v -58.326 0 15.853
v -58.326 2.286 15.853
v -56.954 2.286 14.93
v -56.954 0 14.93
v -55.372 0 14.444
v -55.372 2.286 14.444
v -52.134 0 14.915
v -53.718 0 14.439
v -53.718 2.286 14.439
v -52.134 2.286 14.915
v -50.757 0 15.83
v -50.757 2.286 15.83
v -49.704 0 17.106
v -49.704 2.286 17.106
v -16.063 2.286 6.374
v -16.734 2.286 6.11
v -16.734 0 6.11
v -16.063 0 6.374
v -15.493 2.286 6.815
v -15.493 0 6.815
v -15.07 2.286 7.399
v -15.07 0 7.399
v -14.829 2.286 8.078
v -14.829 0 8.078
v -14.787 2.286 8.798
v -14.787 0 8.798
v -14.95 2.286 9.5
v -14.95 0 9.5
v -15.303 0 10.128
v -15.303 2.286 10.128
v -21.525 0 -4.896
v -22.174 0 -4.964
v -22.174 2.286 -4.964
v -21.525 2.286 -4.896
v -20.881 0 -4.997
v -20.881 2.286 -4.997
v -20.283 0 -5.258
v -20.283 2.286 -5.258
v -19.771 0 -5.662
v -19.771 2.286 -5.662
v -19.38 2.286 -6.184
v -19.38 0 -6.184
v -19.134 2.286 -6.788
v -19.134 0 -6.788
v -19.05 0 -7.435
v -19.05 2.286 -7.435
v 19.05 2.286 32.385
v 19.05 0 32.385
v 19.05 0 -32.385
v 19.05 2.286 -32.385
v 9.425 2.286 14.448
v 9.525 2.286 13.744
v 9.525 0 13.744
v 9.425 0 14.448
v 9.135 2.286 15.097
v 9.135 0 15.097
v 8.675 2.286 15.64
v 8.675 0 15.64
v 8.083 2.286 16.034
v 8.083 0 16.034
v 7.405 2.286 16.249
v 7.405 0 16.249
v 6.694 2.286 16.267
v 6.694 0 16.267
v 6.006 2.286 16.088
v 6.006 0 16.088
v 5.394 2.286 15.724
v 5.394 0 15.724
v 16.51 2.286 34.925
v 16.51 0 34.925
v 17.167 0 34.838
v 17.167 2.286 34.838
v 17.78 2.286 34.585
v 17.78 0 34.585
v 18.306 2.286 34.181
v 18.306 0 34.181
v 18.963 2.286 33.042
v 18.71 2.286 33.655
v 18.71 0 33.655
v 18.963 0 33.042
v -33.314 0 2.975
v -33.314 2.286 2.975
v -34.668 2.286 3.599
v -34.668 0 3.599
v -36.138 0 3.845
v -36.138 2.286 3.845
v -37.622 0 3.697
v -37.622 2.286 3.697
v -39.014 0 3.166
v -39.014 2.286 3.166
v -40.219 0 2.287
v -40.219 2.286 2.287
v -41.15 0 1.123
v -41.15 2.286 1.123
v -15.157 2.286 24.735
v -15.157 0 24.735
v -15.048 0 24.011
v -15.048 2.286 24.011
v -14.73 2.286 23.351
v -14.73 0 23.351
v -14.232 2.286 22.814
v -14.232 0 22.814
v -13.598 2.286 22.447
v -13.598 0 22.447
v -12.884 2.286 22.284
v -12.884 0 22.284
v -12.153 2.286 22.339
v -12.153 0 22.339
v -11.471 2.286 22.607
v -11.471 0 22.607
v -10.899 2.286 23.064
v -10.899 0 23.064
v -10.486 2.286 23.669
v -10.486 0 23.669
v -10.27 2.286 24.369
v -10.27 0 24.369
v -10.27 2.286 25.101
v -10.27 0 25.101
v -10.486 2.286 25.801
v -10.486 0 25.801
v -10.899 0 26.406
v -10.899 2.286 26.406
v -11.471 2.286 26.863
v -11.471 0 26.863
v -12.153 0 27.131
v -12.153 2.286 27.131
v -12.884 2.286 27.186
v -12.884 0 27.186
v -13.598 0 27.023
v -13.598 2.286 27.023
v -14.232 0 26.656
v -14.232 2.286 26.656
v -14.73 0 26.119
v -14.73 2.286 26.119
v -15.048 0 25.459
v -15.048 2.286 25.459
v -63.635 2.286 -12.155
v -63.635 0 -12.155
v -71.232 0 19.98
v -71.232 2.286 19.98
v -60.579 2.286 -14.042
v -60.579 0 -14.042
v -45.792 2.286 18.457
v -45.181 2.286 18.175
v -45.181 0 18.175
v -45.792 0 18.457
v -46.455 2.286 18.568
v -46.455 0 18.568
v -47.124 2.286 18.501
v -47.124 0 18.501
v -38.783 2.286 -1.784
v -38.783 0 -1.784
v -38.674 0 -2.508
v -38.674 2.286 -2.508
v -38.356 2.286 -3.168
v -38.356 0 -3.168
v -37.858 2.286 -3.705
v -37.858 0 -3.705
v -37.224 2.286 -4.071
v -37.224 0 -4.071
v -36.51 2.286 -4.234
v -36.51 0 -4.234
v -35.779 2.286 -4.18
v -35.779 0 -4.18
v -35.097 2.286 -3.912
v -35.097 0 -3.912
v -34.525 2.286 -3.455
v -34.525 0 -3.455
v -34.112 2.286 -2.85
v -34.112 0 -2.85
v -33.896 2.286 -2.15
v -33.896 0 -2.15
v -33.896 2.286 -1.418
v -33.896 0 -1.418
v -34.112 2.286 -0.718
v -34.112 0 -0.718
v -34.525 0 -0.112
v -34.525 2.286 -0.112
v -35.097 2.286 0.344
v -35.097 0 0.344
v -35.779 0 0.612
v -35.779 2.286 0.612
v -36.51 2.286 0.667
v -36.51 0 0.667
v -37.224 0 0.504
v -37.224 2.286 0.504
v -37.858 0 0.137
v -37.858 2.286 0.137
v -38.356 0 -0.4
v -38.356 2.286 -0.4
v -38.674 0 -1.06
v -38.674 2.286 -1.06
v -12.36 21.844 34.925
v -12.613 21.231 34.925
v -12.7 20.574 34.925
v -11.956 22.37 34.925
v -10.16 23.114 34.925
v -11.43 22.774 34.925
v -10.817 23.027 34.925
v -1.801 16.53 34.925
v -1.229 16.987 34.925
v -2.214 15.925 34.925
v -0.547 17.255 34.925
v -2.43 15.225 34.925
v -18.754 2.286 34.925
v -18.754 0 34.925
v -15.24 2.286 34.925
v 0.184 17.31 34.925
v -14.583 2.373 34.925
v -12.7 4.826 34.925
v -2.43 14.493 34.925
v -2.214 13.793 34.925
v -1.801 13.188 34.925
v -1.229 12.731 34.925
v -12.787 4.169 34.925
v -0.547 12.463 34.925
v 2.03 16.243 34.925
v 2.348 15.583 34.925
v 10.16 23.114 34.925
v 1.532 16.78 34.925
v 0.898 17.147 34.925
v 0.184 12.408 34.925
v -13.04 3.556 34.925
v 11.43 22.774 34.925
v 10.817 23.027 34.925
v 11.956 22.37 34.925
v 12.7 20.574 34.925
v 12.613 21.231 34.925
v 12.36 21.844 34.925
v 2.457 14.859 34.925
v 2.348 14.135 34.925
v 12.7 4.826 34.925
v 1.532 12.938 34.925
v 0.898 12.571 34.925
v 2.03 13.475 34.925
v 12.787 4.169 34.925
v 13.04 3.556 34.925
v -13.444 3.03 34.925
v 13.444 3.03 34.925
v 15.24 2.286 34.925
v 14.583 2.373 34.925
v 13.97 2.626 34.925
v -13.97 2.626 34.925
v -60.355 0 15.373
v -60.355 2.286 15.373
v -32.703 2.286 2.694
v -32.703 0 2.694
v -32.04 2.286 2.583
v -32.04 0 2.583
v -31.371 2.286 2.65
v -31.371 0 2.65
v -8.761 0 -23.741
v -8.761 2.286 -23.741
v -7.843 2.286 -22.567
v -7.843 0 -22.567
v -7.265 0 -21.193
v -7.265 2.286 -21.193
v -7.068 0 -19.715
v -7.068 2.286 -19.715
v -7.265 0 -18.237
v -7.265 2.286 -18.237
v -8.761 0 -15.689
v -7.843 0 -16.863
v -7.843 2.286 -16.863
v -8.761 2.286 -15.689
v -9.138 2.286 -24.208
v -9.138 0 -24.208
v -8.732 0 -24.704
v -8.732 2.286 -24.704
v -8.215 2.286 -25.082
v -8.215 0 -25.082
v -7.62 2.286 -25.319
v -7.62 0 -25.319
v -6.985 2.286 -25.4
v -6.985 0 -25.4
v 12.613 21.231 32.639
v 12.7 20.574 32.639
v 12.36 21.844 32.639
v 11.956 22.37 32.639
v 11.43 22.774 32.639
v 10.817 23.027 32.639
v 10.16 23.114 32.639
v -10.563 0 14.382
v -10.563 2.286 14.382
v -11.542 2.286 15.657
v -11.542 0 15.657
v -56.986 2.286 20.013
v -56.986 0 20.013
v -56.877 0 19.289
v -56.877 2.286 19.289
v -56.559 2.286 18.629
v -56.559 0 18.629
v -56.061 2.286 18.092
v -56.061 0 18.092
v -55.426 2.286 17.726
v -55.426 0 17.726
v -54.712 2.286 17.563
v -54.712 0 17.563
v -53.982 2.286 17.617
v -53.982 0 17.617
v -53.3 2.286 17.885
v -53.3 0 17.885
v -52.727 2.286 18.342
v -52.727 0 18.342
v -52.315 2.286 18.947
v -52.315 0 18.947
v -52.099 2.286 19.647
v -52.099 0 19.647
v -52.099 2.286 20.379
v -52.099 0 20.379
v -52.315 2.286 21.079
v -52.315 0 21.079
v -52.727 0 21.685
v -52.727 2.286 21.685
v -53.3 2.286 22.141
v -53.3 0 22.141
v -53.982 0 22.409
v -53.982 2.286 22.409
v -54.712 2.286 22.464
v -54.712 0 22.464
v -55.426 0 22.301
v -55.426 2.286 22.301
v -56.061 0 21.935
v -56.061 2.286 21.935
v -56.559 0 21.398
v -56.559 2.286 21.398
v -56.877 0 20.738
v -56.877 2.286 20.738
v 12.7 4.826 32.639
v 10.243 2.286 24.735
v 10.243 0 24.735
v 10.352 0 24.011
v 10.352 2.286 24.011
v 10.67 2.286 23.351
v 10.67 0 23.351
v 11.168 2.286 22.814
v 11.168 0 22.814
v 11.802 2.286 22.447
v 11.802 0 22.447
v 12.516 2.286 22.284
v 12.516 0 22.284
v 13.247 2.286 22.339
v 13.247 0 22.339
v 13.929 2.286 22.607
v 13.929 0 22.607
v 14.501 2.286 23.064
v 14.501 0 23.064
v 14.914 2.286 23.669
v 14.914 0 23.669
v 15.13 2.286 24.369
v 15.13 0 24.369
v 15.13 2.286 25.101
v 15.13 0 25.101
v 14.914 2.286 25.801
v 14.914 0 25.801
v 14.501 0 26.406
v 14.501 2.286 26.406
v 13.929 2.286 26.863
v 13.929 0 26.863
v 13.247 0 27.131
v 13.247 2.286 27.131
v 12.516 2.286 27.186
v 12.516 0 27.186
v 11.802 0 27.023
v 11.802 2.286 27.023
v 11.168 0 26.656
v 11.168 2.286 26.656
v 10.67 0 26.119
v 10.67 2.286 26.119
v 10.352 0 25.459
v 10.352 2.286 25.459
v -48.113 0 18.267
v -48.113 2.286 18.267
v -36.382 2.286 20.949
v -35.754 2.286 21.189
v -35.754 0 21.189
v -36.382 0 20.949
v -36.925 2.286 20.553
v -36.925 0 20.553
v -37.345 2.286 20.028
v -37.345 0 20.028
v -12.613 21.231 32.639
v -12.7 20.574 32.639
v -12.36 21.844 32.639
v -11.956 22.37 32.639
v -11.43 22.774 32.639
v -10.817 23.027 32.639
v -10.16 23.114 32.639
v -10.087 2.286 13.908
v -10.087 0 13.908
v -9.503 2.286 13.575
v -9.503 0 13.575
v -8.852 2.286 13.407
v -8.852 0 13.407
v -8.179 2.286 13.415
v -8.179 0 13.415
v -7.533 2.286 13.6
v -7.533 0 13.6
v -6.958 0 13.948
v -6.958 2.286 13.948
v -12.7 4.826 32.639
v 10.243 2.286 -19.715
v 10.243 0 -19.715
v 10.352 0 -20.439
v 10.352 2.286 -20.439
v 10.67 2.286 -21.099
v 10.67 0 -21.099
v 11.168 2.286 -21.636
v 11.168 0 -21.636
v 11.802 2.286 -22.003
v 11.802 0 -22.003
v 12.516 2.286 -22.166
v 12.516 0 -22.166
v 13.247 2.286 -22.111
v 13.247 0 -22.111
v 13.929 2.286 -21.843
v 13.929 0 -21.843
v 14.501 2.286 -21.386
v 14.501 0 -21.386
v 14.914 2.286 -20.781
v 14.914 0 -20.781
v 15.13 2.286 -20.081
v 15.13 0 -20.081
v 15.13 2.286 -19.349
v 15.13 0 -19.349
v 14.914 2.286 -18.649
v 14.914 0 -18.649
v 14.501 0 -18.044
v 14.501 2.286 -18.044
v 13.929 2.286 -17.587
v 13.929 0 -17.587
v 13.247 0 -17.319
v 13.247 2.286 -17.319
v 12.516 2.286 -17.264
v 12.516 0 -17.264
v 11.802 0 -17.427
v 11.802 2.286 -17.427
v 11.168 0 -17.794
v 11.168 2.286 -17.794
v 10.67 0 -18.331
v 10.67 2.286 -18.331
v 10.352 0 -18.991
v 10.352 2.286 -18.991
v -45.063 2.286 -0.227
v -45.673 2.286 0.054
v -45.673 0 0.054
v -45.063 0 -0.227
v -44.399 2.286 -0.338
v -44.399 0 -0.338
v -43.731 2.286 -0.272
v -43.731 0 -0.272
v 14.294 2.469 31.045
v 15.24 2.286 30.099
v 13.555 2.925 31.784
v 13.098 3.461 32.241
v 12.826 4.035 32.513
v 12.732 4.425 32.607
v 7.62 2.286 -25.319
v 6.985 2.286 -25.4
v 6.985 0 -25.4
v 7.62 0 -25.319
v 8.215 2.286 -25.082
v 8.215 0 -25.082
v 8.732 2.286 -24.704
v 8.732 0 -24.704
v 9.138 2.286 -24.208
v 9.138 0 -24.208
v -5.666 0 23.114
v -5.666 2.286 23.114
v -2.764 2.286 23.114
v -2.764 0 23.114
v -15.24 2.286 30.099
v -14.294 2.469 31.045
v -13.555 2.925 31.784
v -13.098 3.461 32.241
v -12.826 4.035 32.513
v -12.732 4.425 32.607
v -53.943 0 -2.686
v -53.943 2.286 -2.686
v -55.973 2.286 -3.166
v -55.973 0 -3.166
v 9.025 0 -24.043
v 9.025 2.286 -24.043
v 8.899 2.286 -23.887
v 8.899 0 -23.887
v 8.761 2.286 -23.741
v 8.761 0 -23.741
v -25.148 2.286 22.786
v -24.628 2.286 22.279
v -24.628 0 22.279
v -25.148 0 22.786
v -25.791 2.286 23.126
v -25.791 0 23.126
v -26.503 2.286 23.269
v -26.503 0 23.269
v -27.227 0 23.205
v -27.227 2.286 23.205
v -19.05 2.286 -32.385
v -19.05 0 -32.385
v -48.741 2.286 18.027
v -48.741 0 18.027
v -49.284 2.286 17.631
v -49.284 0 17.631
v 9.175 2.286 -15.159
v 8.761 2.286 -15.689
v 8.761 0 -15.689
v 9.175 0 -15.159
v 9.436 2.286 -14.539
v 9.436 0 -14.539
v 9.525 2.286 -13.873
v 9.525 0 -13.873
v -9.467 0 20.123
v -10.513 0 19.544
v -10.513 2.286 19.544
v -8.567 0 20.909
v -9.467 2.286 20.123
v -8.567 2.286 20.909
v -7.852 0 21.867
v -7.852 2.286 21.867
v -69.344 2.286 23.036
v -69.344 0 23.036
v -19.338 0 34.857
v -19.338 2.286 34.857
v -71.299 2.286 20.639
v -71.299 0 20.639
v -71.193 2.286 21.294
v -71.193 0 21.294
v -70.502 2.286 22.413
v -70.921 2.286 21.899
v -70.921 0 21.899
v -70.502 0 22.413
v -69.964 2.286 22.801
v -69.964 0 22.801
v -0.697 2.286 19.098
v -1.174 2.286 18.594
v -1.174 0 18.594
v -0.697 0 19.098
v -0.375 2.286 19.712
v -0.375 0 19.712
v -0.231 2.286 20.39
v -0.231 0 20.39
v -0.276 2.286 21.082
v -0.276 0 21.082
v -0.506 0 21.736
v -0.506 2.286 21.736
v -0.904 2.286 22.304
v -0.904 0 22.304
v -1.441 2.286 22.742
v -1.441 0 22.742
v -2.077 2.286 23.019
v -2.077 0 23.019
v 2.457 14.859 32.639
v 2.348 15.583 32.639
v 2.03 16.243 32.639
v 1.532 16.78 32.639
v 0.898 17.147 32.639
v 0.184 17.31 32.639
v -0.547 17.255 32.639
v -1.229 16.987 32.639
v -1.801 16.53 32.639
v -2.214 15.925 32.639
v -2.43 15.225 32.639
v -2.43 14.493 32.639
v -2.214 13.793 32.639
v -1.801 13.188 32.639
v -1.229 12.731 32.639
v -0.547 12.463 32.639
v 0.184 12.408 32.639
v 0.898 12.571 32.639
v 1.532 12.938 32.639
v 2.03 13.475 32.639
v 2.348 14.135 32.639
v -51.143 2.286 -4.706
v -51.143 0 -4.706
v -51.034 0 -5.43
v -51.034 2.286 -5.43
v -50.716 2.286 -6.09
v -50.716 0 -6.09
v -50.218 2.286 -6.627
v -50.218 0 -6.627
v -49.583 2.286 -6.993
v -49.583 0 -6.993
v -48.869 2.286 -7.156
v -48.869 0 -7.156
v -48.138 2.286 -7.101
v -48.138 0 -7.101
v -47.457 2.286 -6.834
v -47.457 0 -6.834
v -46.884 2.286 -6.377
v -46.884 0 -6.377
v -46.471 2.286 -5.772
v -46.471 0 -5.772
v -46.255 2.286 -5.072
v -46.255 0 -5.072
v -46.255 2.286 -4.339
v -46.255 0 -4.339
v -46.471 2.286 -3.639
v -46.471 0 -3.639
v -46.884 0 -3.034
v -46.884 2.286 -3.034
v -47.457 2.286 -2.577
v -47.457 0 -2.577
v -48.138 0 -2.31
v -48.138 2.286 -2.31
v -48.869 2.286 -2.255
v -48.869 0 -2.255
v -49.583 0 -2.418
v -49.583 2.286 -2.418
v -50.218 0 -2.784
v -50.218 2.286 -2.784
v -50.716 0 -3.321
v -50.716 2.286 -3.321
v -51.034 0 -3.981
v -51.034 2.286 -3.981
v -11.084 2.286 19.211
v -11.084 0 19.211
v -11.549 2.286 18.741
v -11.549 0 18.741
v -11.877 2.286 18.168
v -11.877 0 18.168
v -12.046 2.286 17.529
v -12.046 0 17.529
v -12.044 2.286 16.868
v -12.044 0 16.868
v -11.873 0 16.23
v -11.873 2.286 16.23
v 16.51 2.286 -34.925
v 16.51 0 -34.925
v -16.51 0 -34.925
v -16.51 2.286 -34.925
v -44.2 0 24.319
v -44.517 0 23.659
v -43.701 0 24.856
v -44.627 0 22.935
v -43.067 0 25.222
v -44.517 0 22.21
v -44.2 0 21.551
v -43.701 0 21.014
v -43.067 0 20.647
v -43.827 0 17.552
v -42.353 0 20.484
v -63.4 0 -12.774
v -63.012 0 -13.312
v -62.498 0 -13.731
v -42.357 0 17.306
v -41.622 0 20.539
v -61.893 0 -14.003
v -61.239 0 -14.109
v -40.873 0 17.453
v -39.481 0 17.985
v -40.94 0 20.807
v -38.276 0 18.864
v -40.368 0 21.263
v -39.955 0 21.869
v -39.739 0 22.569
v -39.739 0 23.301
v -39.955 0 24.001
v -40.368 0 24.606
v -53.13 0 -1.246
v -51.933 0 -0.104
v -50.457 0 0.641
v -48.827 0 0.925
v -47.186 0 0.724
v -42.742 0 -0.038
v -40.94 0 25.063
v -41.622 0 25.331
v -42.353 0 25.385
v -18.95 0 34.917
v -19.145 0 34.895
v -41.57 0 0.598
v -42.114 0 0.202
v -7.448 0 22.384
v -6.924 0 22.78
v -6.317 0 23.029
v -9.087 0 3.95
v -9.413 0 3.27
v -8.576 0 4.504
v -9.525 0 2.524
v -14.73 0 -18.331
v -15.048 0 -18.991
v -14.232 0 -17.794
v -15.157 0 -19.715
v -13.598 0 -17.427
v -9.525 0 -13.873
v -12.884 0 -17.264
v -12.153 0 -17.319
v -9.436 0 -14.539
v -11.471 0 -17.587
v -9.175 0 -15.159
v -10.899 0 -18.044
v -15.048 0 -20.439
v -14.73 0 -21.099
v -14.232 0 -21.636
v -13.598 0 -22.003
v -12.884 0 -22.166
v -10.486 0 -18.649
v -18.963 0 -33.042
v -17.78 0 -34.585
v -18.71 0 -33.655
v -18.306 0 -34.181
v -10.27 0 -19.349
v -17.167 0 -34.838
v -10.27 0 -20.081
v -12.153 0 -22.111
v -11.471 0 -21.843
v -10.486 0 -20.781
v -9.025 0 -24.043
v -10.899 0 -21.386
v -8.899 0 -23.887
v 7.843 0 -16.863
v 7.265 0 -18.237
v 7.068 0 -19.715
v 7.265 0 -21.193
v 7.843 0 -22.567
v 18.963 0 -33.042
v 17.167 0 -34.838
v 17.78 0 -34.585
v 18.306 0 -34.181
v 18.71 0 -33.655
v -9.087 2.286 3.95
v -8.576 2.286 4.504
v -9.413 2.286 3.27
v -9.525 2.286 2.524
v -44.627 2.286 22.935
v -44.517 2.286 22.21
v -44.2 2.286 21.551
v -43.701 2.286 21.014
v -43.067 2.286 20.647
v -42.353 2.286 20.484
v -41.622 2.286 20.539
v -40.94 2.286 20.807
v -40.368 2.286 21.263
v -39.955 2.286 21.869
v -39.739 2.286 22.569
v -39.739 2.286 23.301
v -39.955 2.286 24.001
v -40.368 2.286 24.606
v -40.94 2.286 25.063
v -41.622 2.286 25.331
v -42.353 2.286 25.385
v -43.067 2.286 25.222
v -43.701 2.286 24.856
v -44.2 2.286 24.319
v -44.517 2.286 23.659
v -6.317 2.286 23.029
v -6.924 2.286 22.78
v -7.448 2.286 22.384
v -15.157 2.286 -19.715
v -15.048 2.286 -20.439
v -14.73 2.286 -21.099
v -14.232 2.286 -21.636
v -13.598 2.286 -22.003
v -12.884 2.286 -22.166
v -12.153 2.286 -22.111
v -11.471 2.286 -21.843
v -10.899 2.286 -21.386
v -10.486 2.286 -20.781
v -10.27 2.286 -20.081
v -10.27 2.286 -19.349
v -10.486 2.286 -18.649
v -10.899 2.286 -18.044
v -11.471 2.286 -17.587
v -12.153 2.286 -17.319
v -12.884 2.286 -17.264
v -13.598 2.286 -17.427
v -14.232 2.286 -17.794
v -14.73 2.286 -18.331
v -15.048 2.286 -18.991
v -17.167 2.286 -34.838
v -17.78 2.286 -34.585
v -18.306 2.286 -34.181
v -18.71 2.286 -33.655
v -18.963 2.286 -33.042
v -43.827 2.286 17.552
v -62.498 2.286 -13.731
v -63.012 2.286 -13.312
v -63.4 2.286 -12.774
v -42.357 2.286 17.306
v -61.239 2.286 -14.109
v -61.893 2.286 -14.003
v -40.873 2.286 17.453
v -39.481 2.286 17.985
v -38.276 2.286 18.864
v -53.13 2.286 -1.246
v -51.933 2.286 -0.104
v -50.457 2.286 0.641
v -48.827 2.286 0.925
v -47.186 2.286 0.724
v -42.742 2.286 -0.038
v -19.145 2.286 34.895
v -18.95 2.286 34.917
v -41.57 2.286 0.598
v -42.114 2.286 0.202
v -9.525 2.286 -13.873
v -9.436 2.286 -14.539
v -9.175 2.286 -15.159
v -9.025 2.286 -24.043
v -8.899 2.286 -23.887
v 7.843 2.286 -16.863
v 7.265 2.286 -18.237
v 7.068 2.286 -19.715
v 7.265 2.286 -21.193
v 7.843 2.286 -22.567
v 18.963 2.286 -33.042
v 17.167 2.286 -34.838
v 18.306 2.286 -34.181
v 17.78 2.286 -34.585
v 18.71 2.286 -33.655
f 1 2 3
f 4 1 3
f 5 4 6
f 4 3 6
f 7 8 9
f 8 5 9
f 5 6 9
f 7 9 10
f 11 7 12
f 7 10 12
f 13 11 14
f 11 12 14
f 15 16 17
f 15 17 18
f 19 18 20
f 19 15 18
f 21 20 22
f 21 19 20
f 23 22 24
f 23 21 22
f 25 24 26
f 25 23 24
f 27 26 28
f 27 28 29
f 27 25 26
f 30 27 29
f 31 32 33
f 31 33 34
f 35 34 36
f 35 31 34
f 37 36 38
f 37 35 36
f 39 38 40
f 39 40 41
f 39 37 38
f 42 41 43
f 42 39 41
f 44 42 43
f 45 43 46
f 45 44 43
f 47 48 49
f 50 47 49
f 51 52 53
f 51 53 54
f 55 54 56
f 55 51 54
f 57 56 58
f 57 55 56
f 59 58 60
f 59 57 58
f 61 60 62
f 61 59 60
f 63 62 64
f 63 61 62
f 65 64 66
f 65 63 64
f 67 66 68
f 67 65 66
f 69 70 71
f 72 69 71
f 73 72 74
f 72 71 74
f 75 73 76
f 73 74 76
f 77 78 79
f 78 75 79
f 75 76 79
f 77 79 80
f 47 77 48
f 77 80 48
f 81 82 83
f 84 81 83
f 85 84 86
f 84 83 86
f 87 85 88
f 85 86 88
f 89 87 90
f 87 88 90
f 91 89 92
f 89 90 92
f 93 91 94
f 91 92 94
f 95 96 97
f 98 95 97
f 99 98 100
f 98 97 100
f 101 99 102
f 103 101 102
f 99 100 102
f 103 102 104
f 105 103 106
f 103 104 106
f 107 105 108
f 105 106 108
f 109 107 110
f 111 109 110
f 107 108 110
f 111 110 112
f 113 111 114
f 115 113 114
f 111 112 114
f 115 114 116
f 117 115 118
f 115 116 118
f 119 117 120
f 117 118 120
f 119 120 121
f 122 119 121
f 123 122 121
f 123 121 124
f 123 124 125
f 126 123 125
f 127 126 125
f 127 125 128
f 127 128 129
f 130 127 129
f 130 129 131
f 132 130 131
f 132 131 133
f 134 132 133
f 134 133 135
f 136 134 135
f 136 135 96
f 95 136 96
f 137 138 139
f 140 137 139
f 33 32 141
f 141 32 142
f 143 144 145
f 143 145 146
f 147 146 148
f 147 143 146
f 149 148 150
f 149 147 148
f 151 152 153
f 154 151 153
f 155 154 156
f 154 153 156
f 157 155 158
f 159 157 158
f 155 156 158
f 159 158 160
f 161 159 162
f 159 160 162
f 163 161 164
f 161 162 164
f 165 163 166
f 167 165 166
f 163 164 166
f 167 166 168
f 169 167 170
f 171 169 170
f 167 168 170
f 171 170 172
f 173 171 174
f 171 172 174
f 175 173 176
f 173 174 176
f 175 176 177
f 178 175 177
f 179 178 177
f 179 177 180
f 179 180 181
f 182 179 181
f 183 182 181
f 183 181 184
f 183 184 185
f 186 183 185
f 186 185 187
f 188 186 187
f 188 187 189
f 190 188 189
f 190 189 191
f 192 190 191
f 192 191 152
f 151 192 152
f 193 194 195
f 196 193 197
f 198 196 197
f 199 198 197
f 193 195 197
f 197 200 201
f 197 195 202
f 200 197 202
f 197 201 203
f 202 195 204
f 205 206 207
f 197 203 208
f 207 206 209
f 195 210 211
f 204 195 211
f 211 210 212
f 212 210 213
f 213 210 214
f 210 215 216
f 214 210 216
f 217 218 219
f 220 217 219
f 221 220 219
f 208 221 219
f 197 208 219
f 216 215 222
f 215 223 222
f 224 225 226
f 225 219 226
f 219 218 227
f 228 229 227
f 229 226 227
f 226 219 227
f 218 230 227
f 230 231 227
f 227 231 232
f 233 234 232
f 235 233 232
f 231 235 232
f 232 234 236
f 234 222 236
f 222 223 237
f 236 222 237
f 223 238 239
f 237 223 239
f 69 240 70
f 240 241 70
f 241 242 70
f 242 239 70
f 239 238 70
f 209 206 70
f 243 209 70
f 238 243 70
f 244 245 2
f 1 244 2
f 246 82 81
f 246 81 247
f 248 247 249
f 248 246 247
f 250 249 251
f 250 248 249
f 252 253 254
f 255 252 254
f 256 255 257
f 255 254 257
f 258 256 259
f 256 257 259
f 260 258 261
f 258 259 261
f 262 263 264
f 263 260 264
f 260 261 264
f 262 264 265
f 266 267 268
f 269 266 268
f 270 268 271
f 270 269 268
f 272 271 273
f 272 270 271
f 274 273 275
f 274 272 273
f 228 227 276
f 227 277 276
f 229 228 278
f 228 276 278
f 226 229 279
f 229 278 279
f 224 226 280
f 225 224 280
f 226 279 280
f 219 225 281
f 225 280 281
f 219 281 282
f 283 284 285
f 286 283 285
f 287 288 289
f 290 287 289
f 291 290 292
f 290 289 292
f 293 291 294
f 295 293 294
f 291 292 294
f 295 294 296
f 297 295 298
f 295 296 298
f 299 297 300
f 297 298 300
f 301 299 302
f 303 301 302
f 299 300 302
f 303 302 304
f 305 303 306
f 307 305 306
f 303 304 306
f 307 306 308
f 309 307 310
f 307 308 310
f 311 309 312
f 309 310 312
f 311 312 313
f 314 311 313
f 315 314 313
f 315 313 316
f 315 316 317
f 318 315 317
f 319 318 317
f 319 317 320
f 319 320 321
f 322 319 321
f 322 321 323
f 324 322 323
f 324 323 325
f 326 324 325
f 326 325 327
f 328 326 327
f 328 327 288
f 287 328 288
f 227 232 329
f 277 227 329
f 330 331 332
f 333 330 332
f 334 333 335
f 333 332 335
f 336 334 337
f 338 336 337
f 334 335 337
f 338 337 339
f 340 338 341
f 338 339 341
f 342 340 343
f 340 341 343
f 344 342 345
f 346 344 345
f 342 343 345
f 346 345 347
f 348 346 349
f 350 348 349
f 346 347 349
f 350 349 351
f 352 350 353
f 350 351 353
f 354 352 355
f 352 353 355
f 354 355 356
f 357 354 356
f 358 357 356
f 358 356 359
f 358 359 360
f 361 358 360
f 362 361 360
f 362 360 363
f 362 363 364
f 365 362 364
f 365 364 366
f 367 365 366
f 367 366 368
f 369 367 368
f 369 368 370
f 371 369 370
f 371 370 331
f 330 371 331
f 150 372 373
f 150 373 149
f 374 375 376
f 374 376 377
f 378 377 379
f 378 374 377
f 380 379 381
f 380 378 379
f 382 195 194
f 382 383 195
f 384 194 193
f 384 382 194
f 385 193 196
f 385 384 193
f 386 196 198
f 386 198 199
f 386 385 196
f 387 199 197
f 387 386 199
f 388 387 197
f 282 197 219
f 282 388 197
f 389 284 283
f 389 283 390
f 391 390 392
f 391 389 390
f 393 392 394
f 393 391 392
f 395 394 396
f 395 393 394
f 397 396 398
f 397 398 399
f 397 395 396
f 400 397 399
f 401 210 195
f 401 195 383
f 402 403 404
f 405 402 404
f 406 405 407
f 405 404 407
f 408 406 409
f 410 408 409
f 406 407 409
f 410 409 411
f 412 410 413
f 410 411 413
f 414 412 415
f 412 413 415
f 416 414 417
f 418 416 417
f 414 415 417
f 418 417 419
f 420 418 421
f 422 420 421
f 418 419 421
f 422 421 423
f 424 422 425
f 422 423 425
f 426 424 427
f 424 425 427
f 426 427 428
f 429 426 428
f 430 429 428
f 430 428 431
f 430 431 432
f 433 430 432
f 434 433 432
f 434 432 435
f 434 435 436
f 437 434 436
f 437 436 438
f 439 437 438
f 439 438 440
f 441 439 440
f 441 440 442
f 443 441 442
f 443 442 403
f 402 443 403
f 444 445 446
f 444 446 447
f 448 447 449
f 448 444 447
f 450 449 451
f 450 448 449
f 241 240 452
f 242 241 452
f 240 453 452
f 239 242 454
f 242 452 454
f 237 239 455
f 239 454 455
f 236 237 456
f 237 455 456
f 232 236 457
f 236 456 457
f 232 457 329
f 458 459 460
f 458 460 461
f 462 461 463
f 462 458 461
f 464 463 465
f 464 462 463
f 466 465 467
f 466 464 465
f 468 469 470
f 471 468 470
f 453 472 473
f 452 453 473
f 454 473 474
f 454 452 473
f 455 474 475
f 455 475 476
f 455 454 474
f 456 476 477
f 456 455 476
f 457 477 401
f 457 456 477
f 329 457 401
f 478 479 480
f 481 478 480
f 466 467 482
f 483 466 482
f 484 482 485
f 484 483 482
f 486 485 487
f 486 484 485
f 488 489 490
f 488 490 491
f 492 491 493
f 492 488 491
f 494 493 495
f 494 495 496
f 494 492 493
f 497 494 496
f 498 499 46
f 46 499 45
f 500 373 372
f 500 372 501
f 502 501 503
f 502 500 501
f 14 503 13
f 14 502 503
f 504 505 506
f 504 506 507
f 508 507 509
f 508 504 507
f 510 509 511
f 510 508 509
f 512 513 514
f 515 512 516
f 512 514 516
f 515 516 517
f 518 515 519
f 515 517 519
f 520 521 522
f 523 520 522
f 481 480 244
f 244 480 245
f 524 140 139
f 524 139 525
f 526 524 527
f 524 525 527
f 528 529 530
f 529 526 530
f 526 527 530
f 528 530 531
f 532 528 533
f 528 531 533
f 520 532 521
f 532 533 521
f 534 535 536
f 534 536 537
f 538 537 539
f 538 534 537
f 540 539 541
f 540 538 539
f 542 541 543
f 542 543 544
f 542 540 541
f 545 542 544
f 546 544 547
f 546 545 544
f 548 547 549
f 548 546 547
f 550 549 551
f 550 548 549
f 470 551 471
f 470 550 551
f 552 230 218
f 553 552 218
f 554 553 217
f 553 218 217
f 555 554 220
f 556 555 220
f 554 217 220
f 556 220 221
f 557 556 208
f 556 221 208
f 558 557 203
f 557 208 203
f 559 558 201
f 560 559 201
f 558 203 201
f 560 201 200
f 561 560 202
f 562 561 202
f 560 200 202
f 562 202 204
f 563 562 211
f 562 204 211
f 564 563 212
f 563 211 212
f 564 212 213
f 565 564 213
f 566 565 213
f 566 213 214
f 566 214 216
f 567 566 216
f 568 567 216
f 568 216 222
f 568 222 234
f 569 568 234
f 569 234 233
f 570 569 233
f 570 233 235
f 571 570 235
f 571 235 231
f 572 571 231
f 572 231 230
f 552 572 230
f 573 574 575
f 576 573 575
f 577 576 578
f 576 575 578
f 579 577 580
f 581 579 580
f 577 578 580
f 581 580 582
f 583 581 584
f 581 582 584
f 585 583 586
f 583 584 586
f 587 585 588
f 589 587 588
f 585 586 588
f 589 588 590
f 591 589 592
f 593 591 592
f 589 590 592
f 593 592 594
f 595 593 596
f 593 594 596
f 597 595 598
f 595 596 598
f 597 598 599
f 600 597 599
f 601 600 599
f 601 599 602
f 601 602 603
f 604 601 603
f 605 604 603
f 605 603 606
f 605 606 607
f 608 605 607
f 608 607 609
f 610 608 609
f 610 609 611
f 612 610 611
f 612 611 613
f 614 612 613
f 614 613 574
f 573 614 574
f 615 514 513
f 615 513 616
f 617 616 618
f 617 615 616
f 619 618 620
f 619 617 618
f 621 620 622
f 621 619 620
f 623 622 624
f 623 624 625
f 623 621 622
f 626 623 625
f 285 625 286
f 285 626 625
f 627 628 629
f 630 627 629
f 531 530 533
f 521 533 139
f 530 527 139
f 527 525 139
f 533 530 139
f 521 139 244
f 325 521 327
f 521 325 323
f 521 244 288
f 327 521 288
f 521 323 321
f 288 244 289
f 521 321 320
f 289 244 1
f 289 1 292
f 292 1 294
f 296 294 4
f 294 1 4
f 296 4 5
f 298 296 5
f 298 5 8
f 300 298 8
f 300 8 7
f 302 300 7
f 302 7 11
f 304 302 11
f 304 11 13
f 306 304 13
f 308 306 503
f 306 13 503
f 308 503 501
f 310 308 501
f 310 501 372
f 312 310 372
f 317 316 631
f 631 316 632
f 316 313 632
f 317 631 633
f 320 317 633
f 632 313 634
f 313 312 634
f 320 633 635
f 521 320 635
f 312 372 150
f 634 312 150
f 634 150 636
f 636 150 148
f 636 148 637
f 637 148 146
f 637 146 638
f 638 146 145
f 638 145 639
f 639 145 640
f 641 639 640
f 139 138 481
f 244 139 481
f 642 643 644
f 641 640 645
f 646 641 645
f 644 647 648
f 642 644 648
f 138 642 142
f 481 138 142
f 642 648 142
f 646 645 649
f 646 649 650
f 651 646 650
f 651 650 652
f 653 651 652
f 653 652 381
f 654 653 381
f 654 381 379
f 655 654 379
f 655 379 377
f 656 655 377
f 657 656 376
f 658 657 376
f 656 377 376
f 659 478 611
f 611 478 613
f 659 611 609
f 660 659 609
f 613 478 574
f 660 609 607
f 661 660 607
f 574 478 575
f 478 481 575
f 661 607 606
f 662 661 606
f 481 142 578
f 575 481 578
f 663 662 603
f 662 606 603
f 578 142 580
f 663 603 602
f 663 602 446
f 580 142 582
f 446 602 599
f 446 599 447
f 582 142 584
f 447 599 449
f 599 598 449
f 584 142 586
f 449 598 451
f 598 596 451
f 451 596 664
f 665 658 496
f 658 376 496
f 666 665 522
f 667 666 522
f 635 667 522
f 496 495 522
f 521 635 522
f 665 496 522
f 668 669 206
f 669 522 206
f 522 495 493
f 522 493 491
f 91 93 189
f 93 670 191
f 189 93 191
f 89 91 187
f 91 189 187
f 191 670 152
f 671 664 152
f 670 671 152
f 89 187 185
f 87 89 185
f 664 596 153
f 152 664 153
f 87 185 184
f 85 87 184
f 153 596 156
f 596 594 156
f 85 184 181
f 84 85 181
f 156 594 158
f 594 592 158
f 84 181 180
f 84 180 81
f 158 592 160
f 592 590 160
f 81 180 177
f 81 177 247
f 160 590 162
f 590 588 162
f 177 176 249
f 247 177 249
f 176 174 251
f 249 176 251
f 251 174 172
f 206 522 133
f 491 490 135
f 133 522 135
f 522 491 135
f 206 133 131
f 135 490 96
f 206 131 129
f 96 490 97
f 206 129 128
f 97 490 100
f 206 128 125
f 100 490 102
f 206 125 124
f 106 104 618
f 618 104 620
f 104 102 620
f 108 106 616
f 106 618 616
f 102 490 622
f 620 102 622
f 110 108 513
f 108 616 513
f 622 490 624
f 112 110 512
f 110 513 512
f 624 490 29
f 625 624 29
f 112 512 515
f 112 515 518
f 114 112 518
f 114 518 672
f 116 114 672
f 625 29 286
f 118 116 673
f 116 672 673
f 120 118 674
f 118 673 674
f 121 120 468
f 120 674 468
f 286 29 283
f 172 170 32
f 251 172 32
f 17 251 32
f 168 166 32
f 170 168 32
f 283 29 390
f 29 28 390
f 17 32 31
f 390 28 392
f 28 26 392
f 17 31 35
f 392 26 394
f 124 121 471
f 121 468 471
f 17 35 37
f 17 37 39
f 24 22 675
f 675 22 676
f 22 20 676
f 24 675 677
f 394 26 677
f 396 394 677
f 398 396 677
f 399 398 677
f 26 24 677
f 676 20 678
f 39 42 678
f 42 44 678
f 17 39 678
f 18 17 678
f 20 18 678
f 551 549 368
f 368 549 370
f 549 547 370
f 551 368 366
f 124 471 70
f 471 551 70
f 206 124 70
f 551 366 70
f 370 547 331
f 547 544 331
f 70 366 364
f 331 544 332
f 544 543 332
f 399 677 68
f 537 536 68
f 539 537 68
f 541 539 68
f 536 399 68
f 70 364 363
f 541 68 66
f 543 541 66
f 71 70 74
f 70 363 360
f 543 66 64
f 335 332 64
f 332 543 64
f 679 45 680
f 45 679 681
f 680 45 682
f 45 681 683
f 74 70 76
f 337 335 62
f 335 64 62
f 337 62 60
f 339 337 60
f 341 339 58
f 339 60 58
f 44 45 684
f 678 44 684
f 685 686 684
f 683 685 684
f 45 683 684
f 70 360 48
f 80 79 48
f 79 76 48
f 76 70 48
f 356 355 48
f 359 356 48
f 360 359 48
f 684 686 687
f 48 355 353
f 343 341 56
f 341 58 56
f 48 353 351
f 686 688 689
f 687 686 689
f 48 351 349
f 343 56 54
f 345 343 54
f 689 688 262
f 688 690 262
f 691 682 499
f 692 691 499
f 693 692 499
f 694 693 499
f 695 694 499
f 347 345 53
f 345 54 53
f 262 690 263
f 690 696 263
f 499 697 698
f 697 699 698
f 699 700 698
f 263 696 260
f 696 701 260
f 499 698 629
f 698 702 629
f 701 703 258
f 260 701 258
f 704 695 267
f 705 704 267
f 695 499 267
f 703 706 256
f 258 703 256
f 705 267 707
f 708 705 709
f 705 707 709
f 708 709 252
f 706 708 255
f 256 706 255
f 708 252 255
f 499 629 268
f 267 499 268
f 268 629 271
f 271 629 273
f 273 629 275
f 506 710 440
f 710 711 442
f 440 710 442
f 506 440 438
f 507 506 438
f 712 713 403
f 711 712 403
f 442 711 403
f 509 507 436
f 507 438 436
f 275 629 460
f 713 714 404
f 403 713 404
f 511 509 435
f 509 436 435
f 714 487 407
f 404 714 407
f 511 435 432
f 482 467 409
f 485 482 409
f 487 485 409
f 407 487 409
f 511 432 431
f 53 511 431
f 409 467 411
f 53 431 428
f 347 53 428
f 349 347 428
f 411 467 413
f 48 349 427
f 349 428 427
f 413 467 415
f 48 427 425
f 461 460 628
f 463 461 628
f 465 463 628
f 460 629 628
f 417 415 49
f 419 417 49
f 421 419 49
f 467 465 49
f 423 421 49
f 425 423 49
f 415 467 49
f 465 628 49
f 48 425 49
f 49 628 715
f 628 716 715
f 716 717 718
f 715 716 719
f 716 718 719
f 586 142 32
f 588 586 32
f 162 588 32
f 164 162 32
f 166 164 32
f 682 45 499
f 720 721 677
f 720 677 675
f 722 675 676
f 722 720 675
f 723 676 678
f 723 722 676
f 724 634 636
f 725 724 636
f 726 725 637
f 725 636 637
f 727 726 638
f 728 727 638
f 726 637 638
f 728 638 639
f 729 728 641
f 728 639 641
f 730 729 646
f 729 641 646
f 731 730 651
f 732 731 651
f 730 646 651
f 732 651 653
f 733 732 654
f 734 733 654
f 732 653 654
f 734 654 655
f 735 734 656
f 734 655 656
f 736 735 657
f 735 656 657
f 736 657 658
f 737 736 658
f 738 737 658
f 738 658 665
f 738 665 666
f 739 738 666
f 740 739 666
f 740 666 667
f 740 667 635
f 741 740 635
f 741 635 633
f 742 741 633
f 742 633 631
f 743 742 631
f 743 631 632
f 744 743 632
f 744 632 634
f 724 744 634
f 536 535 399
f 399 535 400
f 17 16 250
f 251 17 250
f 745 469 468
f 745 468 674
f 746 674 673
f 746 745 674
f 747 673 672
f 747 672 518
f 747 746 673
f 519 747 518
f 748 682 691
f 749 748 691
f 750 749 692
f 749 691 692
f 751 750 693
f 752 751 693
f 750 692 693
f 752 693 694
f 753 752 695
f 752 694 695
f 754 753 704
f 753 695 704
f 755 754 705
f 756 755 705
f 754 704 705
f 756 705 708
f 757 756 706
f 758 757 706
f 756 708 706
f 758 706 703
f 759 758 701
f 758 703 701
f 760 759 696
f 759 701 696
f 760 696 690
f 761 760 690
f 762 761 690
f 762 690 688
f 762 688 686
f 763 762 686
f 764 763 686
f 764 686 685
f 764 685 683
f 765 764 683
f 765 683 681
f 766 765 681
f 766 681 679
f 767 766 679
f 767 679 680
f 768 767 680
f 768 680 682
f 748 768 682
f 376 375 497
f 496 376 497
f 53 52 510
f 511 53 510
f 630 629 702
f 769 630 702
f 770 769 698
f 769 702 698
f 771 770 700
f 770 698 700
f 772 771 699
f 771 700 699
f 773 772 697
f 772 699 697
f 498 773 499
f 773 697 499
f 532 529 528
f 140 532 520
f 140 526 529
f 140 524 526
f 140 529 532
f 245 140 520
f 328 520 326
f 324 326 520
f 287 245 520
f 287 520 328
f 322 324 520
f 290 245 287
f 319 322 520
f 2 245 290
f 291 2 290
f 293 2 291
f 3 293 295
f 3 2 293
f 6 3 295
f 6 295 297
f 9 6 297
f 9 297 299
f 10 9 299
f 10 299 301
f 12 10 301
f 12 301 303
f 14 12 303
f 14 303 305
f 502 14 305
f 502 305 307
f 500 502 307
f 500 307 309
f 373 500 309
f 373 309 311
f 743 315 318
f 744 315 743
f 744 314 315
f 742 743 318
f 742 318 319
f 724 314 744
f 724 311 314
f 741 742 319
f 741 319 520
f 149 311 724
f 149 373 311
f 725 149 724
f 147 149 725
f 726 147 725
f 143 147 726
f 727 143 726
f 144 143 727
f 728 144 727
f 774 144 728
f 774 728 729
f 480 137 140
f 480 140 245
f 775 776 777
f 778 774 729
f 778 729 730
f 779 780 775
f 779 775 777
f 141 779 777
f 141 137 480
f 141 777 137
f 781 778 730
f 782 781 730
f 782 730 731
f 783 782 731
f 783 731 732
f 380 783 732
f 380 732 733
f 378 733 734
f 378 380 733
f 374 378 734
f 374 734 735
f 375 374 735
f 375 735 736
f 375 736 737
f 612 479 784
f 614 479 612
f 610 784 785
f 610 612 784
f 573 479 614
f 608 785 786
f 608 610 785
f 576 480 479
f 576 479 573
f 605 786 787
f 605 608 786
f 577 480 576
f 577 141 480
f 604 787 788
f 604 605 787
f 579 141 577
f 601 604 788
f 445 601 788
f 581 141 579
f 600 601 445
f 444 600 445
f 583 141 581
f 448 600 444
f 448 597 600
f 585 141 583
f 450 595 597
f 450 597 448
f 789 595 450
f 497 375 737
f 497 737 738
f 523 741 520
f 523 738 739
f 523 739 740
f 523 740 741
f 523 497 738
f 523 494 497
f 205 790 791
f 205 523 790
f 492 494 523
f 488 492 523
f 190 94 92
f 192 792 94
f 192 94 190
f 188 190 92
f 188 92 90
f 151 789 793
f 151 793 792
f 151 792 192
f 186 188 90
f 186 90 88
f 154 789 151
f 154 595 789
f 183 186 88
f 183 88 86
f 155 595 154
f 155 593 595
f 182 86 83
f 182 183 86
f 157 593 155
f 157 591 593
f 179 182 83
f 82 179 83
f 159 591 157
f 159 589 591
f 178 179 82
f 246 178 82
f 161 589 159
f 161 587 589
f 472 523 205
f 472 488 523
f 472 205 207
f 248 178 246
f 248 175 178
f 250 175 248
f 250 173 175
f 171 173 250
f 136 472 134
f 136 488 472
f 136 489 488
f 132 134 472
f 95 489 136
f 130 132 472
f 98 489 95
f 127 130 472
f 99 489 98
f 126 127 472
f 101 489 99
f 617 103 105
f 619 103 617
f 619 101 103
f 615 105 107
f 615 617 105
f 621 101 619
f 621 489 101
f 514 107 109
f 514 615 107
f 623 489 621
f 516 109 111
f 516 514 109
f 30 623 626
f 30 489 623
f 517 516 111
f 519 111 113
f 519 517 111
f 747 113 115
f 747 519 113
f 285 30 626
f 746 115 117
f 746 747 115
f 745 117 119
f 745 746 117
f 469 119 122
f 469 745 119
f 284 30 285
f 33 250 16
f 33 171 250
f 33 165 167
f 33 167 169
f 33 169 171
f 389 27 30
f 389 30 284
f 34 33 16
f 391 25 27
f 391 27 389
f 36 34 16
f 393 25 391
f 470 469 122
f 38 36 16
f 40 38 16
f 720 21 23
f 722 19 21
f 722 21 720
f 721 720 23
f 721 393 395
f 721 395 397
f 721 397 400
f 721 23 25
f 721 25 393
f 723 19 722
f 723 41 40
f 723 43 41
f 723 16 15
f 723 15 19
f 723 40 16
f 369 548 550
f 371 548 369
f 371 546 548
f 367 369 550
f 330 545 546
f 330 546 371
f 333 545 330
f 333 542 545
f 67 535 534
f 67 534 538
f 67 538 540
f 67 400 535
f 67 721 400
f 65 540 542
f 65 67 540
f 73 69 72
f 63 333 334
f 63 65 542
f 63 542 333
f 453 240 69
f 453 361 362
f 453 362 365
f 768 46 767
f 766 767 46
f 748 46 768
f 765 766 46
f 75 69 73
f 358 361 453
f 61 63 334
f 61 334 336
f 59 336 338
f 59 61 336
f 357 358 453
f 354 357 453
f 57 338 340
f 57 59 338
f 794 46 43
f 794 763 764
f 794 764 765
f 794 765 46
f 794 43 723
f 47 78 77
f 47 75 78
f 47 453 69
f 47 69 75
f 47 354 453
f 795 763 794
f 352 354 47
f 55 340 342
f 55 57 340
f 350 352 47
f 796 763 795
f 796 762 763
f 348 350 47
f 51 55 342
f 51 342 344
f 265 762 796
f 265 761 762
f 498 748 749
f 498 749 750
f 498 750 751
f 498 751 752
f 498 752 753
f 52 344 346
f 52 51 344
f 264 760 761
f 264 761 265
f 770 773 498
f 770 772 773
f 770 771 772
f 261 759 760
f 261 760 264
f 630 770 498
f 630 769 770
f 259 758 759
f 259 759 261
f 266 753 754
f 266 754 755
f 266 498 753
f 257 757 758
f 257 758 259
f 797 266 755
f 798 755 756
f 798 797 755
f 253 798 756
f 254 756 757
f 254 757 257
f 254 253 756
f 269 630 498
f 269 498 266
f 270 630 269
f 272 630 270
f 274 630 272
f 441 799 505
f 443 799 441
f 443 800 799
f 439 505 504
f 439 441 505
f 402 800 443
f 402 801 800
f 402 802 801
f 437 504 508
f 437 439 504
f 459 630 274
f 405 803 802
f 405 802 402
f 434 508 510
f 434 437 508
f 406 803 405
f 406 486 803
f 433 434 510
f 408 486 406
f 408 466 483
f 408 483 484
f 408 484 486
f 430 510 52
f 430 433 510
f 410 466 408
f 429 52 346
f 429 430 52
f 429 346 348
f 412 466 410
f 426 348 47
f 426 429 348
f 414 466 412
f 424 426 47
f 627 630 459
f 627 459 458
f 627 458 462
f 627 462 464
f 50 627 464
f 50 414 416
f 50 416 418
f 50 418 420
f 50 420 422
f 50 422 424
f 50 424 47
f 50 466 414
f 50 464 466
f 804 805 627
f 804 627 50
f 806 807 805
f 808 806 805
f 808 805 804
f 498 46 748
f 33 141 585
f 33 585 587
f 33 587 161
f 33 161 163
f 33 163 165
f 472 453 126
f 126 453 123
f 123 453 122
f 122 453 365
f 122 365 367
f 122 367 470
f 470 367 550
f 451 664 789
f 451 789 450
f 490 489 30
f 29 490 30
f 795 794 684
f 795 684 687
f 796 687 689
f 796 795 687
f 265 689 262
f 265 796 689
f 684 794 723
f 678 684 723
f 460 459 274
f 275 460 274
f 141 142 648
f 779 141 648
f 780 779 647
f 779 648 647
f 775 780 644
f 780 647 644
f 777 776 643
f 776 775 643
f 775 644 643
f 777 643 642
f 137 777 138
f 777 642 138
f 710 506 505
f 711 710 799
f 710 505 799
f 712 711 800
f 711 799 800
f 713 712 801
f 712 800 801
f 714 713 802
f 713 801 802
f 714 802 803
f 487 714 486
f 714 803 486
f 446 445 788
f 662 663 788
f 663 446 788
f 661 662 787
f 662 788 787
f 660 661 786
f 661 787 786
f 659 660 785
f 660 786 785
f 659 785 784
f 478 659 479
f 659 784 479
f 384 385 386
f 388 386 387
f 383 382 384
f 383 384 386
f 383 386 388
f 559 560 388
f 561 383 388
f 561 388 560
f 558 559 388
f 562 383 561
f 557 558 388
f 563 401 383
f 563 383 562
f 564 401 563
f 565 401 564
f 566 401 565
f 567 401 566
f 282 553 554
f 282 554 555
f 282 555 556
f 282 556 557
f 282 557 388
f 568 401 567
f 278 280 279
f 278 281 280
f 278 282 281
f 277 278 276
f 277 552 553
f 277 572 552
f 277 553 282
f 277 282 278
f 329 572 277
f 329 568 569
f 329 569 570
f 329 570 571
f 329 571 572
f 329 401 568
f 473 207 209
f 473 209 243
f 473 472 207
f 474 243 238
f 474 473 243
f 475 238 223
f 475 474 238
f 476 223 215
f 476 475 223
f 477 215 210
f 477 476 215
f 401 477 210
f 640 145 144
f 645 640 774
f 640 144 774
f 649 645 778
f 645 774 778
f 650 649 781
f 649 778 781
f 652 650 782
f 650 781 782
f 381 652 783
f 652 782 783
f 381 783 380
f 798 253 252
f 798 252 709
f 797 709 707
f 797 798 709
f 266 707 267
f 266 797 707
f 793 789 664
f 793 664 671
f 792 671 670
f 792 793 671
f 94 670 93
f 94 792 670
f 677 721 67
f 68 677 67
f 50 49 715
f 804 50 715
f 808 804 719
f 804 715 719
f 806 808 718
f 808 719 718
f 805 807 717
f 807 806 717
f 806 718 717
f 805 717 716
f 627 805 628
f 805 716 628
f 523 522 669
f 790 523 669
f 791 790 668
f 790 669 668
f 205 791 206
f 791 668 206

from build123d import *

# Parameters (mm, degrees)
BOSS_EXTRUDE1_DEPTH          = 2.286
SKETCH2_W                    = 25.4
SKETCH2_H                    = 2.286
BOSS_EXTRUDE2_DEPTH          = 20.828
F_10_0_1935_DIAMETER_HOLE1_D = 4.9149
F_10_0_1935_DIAMETER_HOLE2_D = 4.9149
F_10_0_1935_DIAMETER_HOLE3_D = 4.9149
CUT_EXTRUDE1_DEPTH           = 50.8
FILLET1_R                    = 2.54
FILLET2_R                    = 2.54


with BuildPart() as part:
    # Sketch1 → Boss-Extrude1 (new body)
    with BuildSketch(Plane(origin=(0, 0, 0), x_dir=(1, 0, 0), z_dir=(0, 1, 0))):
        Polygon((19.05, 34.925), (-19.05, 34.925), (-19.05, 4.22504843), (-63.051024839, 14.626449943), (-71.815919826, -22.451665109), (-19.05, -34.925), (19.05, -34.925), align=None)
    extrude(amount=BOSS_EXTRUDE1_DEPTH)

    # Sketch2 → Boss-Extrude2 (add)
    with BuildSketch(Plane(origin=(0, 2.286, 0), x_dir=(1, 0, 0), z_dir=(0, 1, 0))):
        with Locations((0, -33.782)):
            Rectangle(SKETCH2_W, SKETCH2_H)
    extrude(amount=BOSS_EXTRUDE2_DEPTH)

    # #10 (0.1935) Diameter Hole1 (through all)
    with Locations(Plane(origin=(0, 2.286, 0), x_dir=(1, 0, 0), z_dir=(0, 1, 0))):
        with Locations((-12.7, -24.735), (12.7, -24.735), (-12.7, 19.715), (12.7, 19.715)):
            Hole(F_10_0_1935_DIAMETER_HOLE1_D / 2)

    # #10 (0.1935) Diameter Hole2 (through all)
    with Locations(Plane(origin=(0, 0, 32.639), x_dir=(-1, 0, 0), z_dir=(0, 0, -1))):
        with Locations((0, 14.859)):
            Hole(F_10_0_1935_DIAMETER_HOLE2_D / 2)

    # #10 (0.1935) Diameter Hole3 (through all)
    with Locations(Plane(origin=(0, 2.286, 0), x_dir=(1, 0, 0), z_dir=(0, 1, 0))):
        with Locations((-48.685323349, 4.705533941), (-36.325951665, 1.783902278), (-54.528586674, -20.013209428), (-42.169214989, -22.93484109)):
            Hole(F_10_0_1935_DIAMETER_HOLE3_D / 2)

    # Sketch10 → Cut-Extrude1 (cut)
    with BuildSketch(Plane(origin=(0, 2.286, 0), x_dir=(1, 0, 0), z_dir=(0, 1, 0))):
        with BuildLine():
            Line((-9.525, -3.741848106), (9.525, -19.04176984))
            Line((9.525, -19.04176984), (9.525, 15.062702933))
            ThreePointArc((9.525, 15.062702933), (7.06755, 19.715), (9.525, 24.367297067))
            Line((9.525, 24.367297067), (9.525, 25.4))
            Line((9.525, 25.4), (-9.525, 25.4))
            Line((-9.525, 25.4), (-9.525, 24.367297067))
            ThreePointArc((-9.525, 24.367297067), (-7.06755, 19.715), (-9.525, 15.062702933))
            Line((-9.525, 15.062702933), (-9.525, -3.741848106))
        make_face()
        with BuildLine():
            Line((-7.305850206, -23.114), (4.454648276, -23.114))
            Line((4.454648276, -23.114), (-8.982344597, -12.322139669))
            Line((-8.982344597, -12.322139669), (-14.383129392, -19.359912238))
            ThreePointArc((-14.383129392, -19.359912238), (-10.060641775, -19.759230596), (-7.305850206, -23.114))
        make_face()
        with BuildLine():
            Line((-25.627859788, -23.582547729), (-12.912609208, -7.013281383))
            Line((-12.912609208, -7.013281383), (-32.528842365, -2.37620036))
            ThreePointArc((-32.528842365, -2.37620036), (-37.621695307, -3.697479064), (-41.583876796, -0.235680925))
            Line((-41.583876796, -0.235680925), (-44.888214049, 0.545431302))
            ThreePointArc((-44.888214049, 0.545431302), (-49.981066991, -0.775847401), (-53.94324848, 2.685950737))
            Line((-53.94324848, 2.685950737), (-55.972719823, 3.165697433))
            Line((-55.972719823, 3.165697433), (-60.355167316, -15.373360093))
            Line((-60.355167316, -15.373360093), (-58.325695974, -15.853106789))
            ThreePointArc((-58.325695974, -15.853106789), (-53.232843031, -14.531828086), (-49.270661542, -17.993626224))
            Line((-49.270661542, -17.993626224), (-45.96632429, -18.774738451))
            ThreePointArc((-45.96632429, -18.774738451), (-40.873471347, -17.453459748), (-36.911289858, -20.915257887))
            Line((-36.911289858, -20.915257887), (-25.627859788, -23.582547729))
        make_face()
    extrude(amount=-CUT_EXTRUDE1_DEPTH, mode=Mode.SUBTRACT)

    # Fillet1
    # the kernel refuses this fillet: 2.54 mm, written as the material it adds along each edge
    with BuildSketch(Plane(origin=(-19.05, 0, -4.22504843), x_dir=(0, 0, -1), z_dir=(0, 1, 0))) as fillet1_piece_1:
        with BuildLine():
            CenterArc((FILLET1_R * 1.26395030924, FILLET1_R), FILLET1_R, 166.7, 103.3)
            Line((FILLET1_R * 0.290771436458, FILLET1_R * 1.23004973719), (0, 0))
            Line((0, 0), (FILLET1_R * 1.26395030924, 0))
        make_face()
    extrude(amount=2.286)
    with BuildSketch(Plane(origin=(9.525, 2.286, -24.367297067), x_dir=(-0.773382110639457, 0, 0.6339401477607004), z_dir=(0, -1, 0)), Plane(origin=(-41.583876796, 2.286, 0.235680925), x_dir=(0.4390208071072497, 0, 0.8984768950434391), z_dir=(0, -1, 0)), Plane(origin=(-36.911289858, 2.286, 20.915257887), x_dir=(-0.43902080710723695, 0, -0.8984768950434453), z_dir=(0, -1, 0))) as fillet1_piece_2:
        with BuildLine():
            CenterArc((1.21025793, 2.5302202), FILLET1_R, 219.341421459, 45.629074101)
            Line((-0.754132631, 0.920012225), (0, 0))
            ThreePointArc((0, 0), (0.493789689, 0.021686706), (0.987579378, 0))
        make_face()
    extrude(amount=2.286)
    with BuildSketch(Plane(origin=(9.525, 2.286, -15.062702933), x_dir=(0, 0, 1), z_dir=(0, -1, 0)), Plane(origin=(-9.525, 2.286, -24.367297067), x_dir=(0, 0, -1), z_dir=(0, -1, 0)), Plane(origin=(-32.528842365, 2.286, 2.37620036), x_dir=(0.9731788727770777, 0, 0.23004973718814892), z_dir=(0, -1, 0)), Plane(origin=(-45.96632429, 2.286, 18.774738451), x_dir=(-0.9731788727770783, 0, -0.23004973718814611), z_dir=(0, -1, 0)), Plane(origin=(-44.888214049, 2.286, -0.545431302), x_dir=(0.9731788727770778, 0, 0.2300497371881489), z_dir=(0, -1, 0))) as fillet1_piece_3:
        with BuildLine():
            CenterArc((1.189595948, 2.54), FILLET1_R, 224.370925899, 45.629074101)
            ThreePointArc((-0.626066217, 0.763776224), (-0.296260998, 0.395636185), (0, 0))
            Line((0, 0), (1.189595948, 0))
        make_face()
    extrude(amount=2.286)
    with BuildSketch(Plane(origin=(9.525, 2.286, 19.04176984), x_dir=(-0.7796710587119345, 0, -0.6261893006168431), z_dir=(0, -1, 0))) as fillet1_piece_4:
        with BuildLine():
            CenterArc((FILLET1_R * 2.08573767417, FILLET1_R), FILLET1_R, 141.230467708, 128.769532292)
            Line((FILLET1_R * 1.30606661546, FILLET1_R * 1.62618930062), (0, 0))
            Line((0, 0), (FILLET1_R * 2.08573767417, 0))
        make_face()
    extrude(amount=2.286)
    with BuildSketch(Plane(origin=(-9.525, 2.286, 3.741848106), x_dir=(0, 0, -1), z_dir=(0, -1, 0))) as fillet1_piece_5:
        with BuildLine():
            CenterArc((FILLET1_R * 0.47944667845, FILLET1_R), FILLET1_R, 218.769532292, 51.230467708)
            Line((-FILLET1_R * 0.300224380262, FILLET1_R * 0.373810699383), (0, 0))
            Line((0, 0), (FILLET1_R * 0.47944667845, 0))
        make_face()
    extrude(amount=2.286)
    with BuildSketch(Plane(origin=(-9.525, 2.286, -15.062702933), x_dir=(0, 0, 1), z_dir=(0, -1, 0)), Plane(origin=(-49.270661542, 2.286, 17.993626224), x_dir=(0.9731788727770844, 0, 0.23004973718812088), z_dir=(0, -1, 0))) as fillet1_piece_6:
        with BuildLine():
            CenterArc((1.189595948, -2.54), FILLET1_R, 90, 45.629074101)
            ThreePointArc((-0.626066217, -0.763776224), (-0.296260998, -0.395636185), (0, 0))
            Line((0, 0), (1.189595948, 0))
        make_face()
    extrude(amount=2.286)
    with BuildSketch(Plane(origin=(-9.525, 2.286, -25.4), x_dir=(1, 0, 0), z_dir=(0, -1, 0)), Plane(origin=(9.525, 2.286, -25.4), x_dir=(0, 0, 1), z_dir=(0, -1, 0))) as fillet1_piece_7:
        with BuildLine():
            CenterArc((FILLET1_R, FILLET1_R), FILLET1_R, 180, 90)
            Line((0, FILLET1_R), (0, 0))
            Line((0, 0), (FILLET1_R, 0))
        make_face()
    extrude(amount=2.286)
    with BuildSketch(Plane(origin=(-7.305850206, 2.286, 23.114), x_dir=(1, 0, 0), z_dir=(0, -1, 0))) as fillet1_piece_8:
        with BuildLine():
            CenterArc((1.639698228, -2.54), FILLET1_R, 90, 59.392795524)
            ThreePointArc((-0.546423923, -1.246759907), (-0.235408974, -0.639948065), (0, 0))
            Line((0, 0), (1.639698228, 0))
        make_face()
    extrude(amount=2.286)
    with BuildSketch(Plane(origin=(-14.383129392, 2.286, 19.359912238), x_dir=(0.6087977522043749, 0, -0.7933254672017661), z_dir=(0, -1, 0))) as fillet1_piece_9:
        with BuildLine():
            CenterArc((4.66706616, 2.54), FILLET1_R, 165.34503033, 104.65496967)
            ThreePointArc((2.209700261, 3.182614066), (1.387122014, 1.395324661), (0, 0))
            Line((0, 0), (4.66706616, 0))
        make_face()
    extrude(amount=2.286)
    with BuildSketch(Plane(origin=(-8.982344597, 2.286, 12.322139669), x_dir=(0.7796710587119348, 0, 0.6261893006168427), z_dir=(0, -1, 0))) as fillet1_piece_10:
        with BuildLine():
            CenterArc((FILLET1_R * 1.02235985184, FILLET1_R), FILLET1_R, 178.733091006, 91.266908994)
            Line((FILLET1_R * 0.0226043062578, FILLET1_R * 1.02210993147), (0, 0))
            Line((0, 0), (FILLET1_R * 1.02235985184, 0))
        make_face()
    extrude(amount=2.286)
    with BuildSketch(Plane(origin=(4.454648276, 2.286, 23.114), x_dir=(-1, 0, 0), z_dir=(0, -1, 0))) as fillet1_piece_11:
        with BuildLine():
            CenterArc((FILLET1_R * 2.84206558138, FILLET1_R), FILLET1_R, 128.769532292, 141.230467708)
            Line((FILLET1_R * 2.21587628076, FILLET1_R * 1.77967105871), (0, 0))
            Line((0, 0), (FILLET1_R * 2.84206558138, 0))
        make_face()
    extrude(amount=2.286)
    with BuildSketch(Plane(origin=(-12.912609208, 2.286, 7.013281383), x_dir=(-0.6087977522043783, 0, 0.7933254672017636), z_dir=(0, -1, 0))) as fillet1_piece_12:
        with BuildLine():
            CenterArc((FILLET1_R * 1.54584224651, FILLET1_R), FILLET1_R, 155.797376702, 114.202623298)
            Line((FILLET1_R * 0.633740899703, FILLET1_R * 1.40996479501), (0, 0))
            Line((0, 0), (FILLET1_R * 1.54584224651, 0))
        make_face()
    extrude(amount=2.286)
    with BuildSketch(Plane(origin=(-25.627859788, 2.286, 23.582547729), x_dir=(-0.9731788727770897, 0, -0.2300497371880981), z_dir=(0, -1, 0))) as fillet1_piece_13:
        with BuildLine():
            CenterArc((FILLET1_R * 0.646896539576, FILLET1_R), FILLET1_R, 204.202623298, 65.797376702)
            Line((-FILLET1_R * 0.265204807237, FILLET1_R * 0.590035204995), (0, 0))
            Line((0, 0), (FILLET1_R * 0.646896539576, 0))
        make_face()
    extrude(amount=2.286)
    # the kernel refuses this fillet: 2.54 mm, written as the material it takes off along each edge
    with BuildSketch(Plane(origin=(-63.051024839, -6.35, -14.626449943), x_dir=(-0.23004973718809857, 0, 0.9731788727770896), z_dir=(0, 1, 0)), Plane(origin=(19.05, -6.35, -34.925), x_dir=(-1, 0, 0), z_dir=(0, 1, 0)), Plane(origin=(19.05, -6.35, 34.925), x_dir=(0, 0, -1), z_dir=(0, 1, 0)), Plane(origin=(-71.815919826, -6.35, 22.451665109), x_dir=(0.9731788727770898, 0, 0.23004973718809796), z_dir=(0, 1, 0))) as fillet1_2_piece_1:
        with BuildLine():
            CenterArc((FILLET1_R, FILLET1_R), FILLET1_R, 180, 90)
            Line((0, FILLET1_R), (0, 0))
            Line((0, 0), (FILLET1_R, 0))
        make_face()
    extrude(amount=14.986, mode=Mode.SUBTRACT)
    with BuildSketch(Plane(origin=(-19.05, -6.35, -34.925), x_dir=(1, 0, 0), z_dir=(0, 1, 0))) as fillet1_2_piece_2:
        with BuildLine():
            CenterArc((FILLET1_R, -FILLET1_R), FILLET1_R, 90, 90)
            Line((0, -FILLET1_R), (0, 0))
            Line((0, 0), (FILLET1_R, 0))
        make_face()
    extrude(amount=14.986, mode=Mode.SUBTRACT)
    with BuildSketch(Plane(origin=(-19.05, -0.740336242, 34.925), x_dir=(1, 0, 0), z_dir=(0, 1, 0))) as fillet1_2_piece_3:
        with BuildLine():
            CenterArc((FILLET1_R * 0.116588384541, FILLET1_R), FILLET1_R, 256.7, 13.3)
            Line((-FILLET1_R * 0.113461352647, FILLET1_R * 0.0268211272229), (0, 0))
            Line((0, 0), (FILLET1_R * 0.116588384541, 0))
        make_face()
    extrude(amount=3.766672484, mode=Mode.SUBTRACT)

    # Fillet2
    fillet2_edges = [part.edges().sort_by_distance(p)[0] for p in [
        (12.7, 2.286, 33.782),
        (0, 2.286, 32.639),
        (-12.7, 2.286, 33.782),
        (12.7, 23.114, 33.782),
        (-12.7, 23.114, 33.782),
    ]]
    fillet(fillet2_edges, radius=FILLET2_R)


solid = part.part
